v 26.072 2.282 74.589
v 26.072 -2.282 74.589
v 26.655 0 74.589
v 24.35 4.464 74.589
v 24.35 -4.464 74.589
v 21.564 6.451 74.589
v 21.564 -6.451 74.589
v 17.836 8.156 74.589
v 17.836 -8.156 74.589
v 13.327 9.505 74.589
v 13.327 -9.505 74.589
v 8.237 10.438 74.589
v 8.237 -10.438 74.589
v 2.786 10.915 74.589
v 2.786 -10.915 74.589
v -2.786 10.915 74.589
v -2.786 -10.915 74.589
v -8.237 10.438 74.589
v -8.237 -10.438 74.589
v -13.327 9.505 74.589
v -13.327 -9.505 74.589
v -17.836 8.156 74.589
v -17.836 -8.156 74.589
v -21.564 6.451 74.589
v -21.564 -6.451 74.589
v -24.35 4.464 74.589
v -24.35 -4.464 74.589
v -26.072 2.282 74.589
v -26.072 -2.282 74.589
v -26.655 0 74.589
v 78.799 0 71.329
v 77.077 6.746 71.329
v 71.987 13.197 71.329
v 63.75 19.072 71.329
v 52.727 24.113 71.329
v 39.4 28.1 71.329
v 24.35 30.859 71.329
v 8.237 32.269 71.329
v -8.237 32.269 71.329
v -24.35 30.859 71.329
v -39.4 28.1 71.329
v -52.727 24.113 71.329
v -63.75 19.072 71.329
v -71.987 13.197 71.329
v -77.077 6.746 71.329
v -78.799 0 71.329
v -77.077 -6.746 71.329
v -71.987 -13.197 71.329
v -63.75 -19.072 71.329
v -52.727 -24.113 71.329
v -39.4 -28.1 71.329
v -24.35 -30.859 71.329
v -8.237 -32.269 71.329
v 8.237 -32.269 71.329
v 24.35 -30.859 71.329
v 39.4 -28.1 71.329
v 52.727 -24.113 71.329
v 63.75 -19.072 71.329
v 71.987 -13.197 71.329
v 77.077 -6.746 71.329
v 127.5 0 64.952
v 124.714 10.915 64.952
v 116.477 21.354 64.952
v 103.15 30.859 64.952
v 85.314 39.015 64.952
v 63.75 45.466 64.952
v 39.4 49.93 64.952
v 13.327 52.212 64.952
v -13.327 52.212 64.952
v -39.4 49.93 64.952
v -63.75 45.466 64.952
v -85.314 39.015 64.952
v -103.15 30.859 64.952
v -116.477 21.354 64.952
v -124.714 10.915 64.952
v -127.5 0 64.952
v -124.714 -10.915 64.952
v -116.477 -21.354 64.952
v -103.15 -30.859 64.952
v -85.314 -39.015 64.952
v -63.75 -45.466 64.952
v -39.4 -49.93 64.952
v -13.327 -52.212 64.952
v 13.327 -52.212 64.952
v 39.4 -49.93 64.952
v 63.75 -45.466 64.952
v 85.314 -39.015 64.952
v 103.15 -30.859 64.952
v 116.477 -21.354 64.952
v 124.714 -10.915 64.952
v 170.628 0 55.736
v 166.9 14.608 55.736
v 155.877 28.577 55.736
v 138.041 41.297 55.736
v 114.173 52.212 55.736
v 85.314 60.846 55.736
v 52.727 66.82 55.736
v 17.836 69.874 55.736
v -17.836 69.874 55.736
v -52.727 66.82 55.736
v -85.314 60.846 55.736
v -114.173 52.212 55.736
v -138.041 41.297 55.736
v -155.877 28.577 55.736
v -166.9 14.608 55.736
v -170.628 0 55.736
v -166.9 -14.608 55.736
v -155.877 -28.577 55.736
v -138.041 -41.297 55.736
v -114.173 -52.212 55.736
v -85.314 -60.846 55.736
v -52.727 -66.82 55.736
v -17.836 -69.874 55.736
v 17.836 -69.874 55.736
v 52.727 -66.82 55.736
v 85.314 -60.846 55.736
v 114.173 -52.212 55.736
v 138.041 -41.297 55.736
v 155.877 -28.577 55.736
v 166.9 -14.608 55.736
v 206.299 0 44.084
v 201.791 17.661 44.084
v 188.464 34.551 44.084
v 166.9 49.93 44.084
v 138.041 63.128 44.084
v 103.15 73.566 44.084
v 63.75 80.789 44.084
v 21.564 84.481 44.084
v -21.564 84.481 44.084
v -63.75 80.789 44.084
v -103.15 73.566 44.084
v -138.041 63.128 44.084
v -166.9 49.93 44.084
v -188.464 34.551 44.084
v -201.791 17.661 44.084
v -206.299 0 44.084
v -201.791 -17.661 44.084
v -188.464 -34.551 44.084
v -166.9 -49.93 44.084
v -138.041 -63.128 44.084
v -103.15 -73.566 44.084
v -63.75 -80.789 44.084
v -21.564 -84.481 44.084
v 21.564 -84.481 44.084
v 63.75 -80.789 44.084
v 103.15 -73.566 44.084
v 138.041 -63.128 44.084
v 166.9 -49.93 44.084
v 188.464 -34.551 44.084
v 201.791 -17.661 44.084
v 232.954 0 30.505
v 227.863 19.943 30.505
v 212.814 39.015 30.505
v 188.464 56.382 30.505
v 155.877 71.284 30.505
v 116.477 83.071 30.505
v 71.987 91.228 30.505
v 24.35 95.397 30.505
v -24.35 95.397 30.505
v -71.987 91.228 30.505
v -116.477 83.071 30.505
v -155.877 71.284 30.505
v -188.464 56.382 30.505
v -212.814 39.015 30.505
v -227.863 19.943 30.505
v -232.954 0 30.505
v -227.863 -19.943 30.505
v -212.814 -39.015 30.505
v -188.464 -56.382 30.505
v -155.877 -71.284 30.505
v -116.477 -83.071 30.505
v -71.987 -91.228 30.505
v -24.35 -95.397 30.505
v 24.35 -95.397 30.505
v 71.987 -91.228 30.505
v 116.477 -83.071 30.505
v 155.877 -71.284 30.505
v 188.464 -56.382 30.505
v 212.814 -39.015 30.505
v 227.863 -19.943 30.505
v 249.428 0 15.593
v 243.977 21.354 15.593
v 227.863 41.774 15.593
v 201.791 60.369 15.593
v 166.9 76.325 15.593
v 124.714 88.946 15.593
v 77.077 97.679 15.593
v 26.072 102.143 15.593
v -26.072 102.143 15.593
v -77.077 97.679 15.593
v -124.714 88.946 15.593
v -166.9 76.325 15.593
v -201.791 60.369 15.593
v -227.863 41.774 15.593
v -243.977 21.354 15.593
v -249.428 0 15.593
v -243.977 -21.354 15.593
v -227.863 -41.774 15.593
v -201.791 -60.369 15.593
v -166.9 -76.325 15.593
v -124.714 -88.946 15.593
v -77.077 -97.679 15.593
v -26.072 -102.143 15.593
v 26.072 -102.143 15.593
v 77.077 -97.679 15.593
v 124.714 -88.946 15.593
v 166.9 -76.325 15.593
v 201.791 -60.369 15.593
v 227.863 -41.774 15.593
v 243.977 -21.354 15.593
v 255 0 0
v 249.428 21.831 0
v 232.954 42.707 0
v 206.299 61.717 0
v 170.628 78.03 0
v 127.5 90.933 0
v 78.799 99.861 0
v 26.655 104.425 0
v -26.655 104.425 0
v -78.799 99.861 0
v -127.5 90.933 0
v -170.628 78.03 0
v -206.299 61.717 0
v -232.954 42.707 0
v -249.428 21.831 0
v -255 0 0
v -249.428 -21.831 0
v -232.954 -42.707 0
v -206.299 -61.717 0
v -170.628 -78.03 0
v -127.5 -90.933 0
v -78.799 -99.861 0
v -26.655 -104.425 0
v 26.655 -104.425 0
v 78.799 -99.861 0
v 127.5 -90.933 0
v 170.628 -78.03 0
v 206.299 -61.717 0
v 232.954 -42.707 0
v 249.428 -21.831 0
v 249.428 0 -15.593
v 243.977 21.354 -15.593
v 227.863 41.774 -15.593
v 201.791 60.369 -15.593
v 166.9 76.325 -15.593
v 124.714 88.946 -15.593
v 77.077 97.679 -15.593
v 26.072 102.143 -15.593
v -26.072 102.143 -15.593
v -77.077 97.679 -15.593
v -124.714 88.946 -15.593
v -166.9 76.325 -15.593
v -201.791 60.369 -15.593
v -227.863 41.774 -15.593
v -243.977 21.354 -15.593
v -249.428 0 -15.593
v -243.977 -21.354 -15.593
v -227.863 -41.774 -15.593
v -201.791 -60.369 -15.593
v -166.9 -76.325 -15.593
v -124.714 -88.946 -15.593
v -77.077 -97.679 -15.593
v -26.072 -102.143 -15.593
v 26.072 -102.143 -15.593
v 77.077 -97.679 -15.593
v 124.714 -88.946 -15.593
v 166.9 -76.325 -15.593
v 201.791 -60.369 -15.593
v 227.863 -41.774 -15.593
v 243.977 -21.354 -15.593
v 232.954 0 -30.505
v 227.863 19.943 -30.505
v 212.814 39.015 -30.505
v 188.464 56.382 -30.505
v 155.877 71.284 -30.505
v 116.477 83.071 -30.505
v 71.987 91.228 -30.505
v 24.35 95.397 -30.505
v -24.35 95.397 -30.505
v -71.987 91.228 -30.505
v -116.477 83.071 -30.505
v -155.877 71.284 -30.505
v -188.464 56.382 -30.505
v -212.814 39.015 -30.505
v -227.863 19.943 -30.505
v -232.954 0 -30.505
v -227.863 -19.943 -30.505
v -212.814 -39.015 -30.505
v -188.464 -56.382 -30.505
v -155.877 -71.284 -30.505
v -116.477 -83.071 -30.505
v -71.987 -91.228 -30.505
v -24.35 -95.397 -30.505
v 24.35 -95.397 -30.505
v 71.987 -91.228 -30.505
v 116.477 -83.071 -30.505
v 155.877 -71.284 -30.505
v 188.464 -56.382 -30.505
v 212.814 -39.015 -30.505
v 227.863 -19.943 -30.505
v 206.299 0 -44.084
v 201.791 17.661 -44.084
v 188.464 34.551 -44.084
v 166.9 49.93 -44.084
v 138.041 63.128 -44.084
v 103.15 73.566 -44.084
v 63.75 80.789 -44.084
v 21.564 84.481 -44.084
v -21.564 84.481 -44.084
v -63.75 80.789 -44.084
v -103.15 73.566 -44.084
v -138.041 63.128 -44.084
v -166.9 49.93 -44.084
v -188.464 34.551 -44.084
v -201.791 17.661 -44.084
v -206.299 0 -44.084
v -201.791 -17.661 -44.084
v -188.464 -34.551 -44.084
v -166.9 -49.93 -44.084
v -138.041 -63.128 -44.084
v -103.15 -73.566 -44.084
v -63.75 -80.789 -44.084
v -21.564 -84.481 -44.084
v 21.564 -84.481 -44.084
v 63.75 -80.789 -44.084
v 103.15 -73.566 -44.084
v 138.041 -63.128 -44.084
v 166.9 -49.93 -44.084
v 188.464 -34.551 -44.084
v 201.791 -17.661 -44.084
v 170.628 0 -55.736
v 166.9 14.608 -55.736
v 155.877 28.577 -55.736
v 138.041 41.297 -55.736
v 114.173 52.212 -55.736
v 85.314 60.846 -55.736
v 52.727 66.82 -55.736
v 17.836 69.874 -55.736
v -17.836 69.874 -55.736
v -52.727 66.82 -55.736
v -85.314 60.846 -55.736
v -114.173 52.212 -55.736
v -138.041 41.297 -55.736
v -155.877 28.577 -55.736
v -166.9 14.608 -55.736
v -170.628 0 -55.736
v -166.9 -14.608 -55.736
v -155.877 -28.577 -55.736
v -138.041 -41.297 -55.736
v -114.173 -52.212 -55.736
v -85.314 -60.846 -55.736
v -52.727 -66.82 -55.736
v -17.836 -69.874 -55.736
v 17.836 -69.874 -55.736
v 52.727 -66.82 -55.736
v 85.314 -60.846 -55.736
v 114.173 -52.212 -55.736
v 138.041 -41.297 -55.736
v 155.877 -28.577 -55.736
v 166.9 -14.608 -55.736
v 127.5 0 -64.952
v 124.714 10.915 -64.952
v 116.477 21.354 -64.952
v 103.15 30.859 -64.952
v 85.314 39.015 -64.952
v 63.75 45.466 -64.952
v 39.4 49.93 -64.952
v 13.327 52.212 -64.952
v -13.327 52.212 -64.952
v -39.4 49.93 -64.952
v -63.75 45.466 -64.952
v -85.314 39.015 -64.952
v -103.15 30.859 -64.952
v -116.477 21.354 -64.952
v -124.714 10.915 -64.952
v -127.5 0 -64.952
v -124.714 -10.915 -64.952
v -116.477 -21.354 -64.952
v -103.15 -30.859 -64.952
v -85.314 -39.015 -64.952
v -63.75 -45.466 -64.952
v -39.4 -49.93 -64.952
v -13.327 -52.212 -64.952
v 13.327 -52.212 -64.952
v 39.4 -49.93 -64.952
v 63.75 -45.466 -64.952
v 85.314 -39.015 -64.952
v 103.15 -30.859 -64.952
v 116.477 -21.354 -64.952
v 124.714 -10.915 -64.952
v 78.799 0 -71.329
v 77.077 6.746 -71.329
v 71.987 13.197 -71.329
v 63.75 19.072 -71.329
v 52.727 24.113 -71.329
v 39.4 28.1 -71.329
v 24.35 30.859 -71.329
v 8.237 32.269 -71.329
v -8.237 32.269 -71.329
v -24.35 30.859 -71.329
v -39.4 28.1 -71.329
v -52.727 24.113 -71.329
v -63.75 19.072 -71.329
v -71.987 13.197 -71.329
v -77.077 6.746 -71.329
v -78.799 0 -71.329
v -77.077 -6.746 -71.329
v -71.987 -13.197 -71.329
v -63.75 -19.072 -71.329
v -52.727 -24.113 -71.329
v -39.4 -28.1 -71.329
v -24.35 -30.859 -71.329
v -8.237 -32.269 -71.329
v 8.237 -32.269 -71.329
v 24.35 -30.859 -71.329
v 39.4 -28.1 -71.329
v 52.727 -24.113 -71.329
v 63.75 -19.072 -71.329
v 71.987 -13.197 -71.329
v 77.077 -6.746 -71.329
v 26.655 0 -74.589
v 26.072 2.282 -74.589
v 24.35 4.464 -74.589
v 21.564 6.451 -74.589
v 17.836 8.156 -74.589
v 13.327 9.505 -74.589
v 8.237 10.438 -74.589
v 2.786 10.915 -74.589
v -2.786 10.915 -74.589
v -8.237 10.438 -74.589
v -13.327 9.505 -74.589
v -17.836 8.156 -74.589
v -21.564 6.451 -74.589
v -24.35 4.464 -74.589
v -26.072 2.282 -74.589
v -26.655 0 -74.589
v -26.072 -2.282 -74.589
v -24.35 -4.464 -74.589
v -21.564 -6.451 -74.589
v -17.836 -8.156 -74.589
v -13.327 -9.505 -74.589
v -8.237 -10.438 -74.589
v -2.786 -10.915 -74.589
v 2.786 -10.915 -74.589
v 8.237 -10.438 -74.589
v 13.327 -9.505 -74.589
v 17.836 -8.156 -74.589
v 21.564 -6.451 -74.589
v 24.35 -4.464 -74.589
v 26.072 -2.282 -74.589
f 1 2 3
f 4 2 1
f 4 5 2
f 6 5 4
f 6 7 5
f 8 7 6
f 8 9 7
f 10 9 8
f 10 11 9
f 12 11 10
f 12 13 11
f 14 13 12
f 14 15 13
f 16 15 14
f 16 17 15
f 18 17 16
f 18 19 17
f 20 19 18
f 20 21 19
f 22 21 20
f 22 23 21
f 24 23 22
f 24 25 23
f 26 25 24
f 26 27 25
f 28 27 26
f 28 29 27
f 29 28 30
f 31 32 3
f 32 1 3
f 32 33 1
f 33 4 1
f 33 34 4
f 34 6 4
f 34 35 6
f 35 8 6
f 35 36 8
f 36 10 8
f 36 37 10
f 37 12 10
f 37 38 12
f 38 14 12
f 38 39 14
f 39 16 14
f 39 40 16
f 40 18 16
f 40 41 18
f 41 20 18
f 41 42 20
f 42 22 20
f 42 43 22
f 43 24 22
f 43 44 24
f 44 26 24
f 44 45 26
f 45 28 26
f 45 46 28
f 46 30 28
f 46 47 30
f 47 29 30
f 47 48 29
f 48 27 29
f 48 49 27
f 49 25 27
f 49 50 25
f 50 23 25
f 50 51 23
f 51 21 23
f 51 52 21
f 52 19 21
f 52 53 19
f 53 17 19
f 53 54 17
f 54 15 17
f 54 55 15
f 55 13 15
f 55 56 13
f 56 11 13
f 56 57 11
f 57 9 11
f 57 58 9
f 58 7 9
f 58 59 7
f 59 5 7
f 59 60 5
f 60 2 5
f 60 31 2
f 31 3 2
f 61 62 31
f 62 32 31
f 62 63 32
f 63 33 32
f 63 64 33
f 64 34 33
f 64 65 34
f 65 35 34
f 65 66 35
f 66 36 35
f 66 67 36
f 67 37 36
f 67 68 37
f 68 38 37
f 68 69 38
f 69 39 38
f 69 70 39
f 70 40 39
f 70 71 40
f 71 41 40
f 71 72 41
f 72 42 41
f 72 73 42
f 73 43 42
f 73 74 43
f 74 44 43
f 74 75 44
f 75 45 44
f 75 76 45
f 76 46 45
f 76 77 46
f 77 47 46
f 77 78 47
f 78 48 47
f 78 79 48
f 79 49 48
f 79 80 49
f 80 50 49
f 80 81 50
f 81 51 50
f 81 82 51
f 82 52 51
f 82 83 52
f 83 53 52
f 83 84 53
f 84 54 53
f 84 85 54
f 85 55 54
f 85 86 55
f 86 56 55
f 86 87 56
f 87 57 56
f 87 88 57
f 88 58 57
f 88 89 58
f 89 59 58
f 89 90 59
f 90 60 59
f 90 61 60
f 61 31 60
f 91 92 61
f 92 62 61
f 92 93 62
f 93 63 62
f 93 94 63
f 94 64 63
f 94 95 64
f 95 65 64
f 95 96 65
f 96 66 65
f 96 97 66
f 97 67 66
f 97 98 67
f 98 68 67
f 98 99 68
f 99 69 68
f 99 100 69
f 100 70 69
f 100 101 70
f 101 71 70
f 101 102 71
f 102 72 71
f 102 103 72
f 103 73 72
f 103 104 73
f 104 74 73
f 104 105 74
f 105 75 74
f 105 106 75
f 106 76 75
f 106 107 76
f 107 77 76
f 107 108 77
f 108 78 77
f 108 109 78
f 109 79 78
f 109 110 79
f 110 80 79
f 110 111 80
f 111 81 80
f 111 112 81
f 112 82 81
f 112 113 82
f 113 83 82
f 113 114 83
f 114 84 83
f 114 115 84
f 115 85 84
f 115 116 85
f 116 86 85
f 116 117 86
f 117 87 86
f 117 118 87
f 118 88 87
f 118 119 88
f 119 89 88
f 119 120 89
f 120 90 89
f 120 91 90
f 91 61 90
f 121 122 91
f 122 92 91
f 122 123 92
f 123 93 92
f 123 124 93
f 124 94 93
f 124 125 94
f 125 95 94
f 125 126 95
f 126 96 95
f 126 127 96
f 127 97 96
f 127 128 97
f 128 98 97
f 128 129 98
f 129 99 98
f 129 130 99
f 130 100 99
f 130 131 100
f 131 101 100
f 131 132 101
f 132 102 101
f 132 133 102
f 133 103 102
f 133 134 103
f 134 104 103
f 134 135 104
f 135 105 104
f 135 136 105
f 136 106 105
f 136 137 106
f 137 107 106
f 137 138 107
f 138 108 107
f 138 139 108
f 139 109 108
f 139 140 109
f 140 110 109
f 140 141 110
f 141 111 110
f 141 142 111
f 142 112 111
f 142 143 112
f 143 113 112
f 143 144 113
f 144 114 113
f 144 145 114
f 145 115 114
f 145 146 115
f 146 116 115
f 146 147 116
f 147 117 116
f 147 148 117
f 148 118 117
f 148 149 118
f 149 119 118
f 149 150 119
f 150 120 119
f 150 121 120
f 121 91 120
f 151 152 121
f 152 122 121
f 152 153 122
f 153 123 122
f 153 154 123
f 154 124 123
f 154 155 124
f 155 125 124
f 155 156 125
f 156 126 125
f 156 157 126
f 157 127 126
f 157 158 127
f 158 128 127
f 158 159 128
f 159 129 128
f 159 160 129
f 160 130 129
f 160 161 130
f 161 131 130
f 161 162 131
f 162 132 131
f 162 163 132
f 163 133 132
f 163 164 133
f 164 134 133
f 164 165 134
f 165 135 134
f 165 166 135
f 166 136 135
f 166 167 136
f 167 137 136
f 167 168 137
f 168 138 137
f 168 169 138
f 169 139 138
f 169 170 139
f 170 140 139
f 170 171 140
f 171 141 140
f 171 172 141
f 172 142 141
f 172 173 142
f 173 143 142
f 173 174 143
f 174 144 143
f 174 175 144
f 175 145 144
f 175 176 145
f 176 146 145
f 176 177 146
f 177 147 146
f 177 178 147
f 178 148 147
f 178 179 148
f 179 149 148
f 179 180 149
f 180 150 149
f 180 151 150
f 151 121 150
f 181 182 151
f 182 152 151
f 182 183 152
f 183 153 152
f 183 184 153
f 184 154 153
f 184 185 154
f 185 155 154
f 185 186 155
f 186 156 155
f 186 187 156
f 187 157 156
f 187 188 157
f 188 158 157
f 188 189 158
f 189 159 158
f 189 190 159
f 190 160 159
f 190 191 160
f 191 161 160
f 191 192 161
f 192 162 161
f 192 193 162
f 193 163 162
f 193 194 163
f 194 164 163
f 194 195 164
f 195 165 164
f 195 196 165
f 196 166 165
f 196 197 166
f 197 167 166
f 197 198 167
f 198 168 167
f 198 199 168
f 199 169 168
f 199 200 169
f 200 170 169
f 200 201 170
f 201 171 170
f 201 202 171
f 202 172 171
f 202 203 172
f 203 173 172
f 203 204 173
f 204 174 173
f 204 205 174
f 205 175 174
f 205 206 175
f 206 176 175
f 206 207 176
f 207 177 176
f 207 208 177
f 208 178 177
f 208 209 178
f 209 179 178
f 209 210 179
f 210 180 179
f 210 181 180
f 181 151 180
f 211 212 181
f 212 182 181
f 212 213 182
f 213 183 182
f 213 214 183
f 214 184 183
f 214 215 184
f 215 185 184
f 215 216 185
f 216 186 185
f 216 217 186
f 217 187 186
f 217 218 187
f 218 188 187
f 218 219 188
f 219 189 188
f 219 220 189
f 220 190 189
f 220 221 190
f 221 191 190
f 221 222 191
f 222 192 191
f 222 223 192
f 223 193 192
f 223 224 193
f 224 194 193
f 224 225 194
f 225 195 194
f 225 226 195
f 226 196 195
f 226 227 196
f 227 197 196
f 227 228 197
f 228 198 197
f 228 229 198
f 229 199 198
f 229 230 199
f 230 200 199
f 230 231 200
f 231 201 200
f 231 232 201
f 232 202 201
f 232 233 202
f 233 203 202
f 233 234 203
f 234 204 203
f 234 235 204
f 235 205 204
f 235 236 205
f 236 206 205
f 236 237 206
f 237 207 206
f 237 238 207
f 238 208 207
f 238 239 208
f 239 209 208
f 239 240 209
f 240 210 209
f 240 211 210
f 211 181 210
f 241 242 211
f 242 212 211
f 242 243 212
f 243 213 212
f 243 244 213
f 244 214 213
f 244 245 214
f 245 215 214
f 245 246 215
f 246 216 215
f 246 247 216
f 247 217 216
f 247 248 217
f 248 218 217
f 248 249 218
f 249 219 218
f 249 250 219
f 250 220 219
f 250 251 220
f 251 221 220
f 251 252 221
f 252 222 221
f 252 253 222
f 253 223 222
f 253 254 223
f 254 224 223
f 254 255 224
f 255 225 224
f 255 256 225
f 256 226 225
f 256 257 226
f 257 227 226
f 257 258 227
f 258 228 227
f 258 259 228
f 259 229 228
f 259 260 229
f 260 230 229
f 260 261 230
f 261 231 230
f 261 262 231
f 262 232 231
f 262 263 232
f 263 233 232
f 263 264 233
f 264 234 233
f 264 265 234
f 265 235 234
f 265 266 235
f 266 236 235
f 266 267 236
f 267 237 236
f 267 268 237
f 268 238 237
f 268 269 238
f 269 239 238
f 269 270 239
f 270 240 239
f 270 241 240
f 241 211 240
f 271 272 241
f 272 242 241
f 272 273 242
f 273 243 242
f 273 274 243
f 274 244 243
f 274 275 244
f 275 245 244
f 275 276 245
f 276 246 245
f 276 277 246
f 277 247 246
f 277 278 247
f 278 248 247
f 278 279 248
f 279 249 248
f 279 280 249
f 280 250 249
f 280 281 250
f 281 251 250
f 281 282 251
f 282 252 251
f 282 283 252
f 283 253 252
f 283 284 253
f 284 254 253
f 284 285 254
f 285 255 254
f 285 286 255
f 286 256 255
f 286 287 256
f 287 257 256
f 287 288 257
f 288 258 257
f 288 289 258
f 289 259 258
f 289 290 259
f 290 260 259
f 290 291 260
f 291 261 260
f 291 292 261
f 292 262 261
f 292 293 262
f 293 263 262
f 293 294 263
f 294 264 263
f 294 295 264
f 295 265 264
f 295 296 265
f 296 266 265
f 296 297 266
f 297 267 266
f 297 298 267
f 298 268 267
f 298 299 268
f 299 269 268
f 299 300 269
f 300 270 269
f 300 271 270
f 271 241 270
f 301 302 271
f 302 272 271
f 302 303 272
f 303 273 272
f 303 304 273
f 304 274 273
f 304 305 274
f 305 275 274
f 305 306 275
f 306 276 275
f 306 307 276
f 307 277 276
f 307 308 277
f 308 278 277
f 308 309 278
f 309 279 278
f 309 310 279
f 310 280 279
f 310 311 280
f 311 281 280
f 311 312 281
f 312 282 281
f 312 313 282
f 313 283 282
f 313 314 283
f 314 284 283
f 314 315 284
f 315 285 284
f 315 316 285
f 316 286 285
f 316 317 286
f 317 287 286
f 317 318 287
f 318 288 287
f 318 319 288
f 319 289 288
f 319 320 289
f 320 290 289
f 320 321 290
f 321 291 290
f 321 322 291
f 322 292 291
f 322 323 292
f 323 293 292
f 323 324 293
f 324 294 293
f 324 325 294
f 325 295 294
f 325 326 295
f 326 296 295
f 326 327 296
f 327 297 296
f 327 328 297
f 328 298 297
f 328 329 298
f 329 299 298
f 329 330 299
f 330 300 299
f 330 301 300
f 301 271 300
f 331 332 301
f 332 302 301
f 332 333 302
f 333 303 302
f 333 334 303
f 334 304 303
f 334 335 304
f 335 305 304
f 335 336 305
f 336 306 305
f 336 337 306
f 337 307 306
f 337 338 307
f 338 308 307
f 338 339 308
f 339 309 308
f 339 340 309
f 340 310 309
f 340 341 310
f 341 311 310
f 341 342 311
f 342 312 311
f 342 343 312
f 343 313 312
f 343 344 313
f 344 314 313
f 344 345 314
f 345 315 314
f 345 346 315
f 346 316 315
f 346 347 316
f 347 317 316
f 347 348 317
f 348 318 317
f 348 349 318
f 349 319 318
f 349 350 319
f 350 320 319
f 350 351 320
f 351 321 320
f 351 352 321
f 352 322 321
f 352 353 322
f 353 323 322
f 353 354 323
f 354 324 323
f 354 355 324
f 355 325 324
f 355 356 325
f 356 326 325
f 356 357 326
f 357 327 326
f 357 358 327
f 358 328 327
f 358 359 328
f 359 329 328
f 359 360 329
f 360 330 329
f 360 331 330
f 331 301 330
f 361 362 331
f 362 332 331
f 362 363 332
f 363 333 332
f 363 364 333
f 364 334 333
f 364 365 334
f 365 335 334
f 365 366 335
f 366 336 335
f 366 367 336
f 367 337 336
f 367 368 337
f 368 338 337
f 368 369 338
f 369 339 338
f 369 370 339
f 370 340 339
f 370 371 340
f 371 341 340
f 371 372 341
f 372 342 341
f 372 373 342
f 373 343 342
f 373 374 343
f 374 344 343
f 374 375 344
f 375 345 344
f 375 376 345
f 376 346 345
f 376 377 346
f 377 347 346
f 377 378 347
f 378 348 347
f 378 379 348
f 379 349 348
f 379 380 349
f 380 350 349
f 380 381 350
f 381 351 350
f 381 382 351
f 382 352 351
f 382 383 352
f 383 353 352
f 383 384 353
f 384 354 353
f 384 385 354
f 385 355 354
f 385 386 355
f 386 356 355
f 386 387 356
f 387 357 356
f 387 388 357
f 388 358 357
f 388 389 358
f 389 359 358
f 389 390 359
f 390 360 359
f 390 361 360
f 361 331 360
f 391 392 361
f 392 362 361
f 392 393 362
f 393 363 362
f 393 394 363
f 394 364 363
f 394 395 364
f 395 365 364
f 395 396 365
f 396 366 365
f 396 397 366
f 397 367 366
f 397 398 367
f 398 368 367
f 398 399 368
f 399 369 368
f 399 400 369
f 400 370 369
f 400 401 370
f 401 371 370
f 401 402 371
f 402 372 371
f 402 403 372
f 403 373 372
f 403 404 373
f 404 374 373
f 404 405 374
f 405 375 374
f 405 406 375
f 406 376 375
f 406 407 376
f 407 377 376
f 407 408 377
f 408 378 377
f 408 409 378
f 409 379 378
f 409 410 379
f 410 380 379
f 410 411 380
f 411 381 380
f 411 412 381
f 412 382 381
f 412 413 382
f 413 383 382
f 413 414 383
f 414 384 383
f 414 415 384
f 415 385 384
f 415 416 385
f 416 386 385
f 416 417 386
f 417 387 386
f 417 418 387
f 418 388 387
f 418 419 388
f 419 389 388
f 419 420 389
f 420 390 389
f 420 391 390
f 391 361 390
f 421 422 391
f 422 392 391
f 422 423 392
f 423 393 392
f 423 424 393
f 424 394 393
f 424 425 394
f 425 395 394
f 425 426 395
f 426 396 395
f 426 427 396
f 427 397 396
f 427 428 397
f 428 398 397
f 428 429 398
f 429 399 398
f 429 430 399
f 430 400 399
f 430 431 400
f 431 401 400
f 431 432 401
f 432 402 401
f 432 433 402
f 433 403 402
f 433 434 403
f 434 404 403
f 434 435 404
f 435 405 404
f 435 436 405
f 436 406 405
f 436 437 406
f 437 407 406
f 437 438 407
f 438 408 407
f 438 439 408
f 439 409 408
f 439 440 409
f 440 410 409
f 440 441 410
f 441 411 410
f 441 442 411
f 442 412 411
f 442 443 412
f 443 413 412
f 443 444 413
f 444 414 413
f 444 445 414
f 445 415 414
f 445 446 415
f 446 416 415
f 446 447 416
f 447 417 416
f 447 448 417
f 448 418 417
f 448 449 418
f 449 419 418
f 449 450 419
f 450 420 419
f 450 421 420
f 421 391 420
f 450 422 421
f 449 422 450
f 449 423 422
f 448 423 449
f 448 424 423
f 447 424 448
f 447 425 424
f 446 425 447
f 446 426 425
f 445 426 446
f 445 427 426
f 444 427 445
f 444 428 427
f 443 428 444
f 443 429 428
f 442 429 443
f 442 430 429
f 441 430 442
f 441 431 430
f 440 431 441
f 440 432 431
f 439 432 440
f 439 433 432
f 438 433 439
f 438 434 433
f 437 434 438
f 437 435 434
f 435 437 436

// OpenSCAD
// Generated by SolidPython 1.0.1 on 2020-07-29 00:46:52


scale(v = [17, 7, 5]) {
	sphere(r = 15);
}
/***********************************************
*********      SolidPython code:      **********
************************************************
 
# import packages: SolidPython
from solid import *
from solid.utils import *
from itertools import chain, combinations, permutations


class Resize:

    def __init__(self, scad_file):
        self.scad_file = scad_file
        #self.scad_file = import_scad(scad_file)
        # cone/cylinder param:
        self.r1 = 0
        self.r2 = 0
        self.h = 0
        # rectangular prism param:
        self.w = 0
        self.l = 0
        # ellipse param:
        self.r = 0

    # import OpenScad code (file name corresponds to shape)


    # classify shape + parameters
    def assign(self, param1, param2, param3):
        if self.scad_file == 'cone.scad':
            self.r1 = param1
            self.r2 = param2
            self.h = param3
        elif self.scad_file == 'cylinder.scad':
            self.r1 = param1
            self.r2 = param2
            self.h = param3
        elif self.scad_file == 'rectangularPrism.scad':
            self.h = param1
            self.l = param2
            self.w = param3
        else:
            self.r = param1
            self.h = param2

    # resize parameters
    def iterate(self):
        x = range(3, 20, 2)
        i = 1
        if self.scad_file == 'cone.scad':
            tempList = list(permutations(x, 2))
            for temp in tempList:
                param1 = temp[0]
                param2 = temp[1]
                filepath = 'produced_scad_files/' + 'cone' + str(param1) + '_' + str(param2) + '_' + '.scad'
                scad_render_to_file(cylinder(h=param1, r1=param2, r2=0), filepath)

        elif self.scad_file == 'cylinder.scad':
            tempList = list(permutations(x, 3))
            for temp in tempList:
                param1 = temp[0]
                param2 = temp[1]
                filepath = 'produced_scad_files/' + 'cylinder' + str(param1) + '_' + str(param2) + '_' + '.scad'
                scad_render_to_file(cylinder(h=param1, r1=param2, r2=param2), filepath)

        elif self.scad_file == 'rectangularPrism.scad':
            tempList = list(permutations(x, 3))
            for temp in tempList:
                param1 = temp[0]
                param2 = temp[1]
                param3 = temp[2]
                filepath = 'produced_scad_files/' + 'rectangularPrism' + str(param1) + '_' + str(param2) + '_' + str(
                    param3) + '.scad'
                scad_render_to_file(cube(size=(param1, param2, param3)), filepath)

        elif self.scad_file == 'ellipse.scad':
            tempList = list(permutations(x, 4))
            for temp in tempList:
                param1 = temp[0]
                param2 = temp[1]
                param3 = temp[2]
                param4 = temp[3]
                filepath = 'produced_scad_files/' + 'ellipse' + str(param1) + '_' + str(param2) + '_' + str(param3) + '_' + str(param4) + '.scad'
                scad_render_to_file(scale([param1, param2, param3])(sphere(r=param4)), filepath)

    def render_to_scadfile(self):
        scad_render_to_file(scad, 'example.scad') 
 
************************************************/
